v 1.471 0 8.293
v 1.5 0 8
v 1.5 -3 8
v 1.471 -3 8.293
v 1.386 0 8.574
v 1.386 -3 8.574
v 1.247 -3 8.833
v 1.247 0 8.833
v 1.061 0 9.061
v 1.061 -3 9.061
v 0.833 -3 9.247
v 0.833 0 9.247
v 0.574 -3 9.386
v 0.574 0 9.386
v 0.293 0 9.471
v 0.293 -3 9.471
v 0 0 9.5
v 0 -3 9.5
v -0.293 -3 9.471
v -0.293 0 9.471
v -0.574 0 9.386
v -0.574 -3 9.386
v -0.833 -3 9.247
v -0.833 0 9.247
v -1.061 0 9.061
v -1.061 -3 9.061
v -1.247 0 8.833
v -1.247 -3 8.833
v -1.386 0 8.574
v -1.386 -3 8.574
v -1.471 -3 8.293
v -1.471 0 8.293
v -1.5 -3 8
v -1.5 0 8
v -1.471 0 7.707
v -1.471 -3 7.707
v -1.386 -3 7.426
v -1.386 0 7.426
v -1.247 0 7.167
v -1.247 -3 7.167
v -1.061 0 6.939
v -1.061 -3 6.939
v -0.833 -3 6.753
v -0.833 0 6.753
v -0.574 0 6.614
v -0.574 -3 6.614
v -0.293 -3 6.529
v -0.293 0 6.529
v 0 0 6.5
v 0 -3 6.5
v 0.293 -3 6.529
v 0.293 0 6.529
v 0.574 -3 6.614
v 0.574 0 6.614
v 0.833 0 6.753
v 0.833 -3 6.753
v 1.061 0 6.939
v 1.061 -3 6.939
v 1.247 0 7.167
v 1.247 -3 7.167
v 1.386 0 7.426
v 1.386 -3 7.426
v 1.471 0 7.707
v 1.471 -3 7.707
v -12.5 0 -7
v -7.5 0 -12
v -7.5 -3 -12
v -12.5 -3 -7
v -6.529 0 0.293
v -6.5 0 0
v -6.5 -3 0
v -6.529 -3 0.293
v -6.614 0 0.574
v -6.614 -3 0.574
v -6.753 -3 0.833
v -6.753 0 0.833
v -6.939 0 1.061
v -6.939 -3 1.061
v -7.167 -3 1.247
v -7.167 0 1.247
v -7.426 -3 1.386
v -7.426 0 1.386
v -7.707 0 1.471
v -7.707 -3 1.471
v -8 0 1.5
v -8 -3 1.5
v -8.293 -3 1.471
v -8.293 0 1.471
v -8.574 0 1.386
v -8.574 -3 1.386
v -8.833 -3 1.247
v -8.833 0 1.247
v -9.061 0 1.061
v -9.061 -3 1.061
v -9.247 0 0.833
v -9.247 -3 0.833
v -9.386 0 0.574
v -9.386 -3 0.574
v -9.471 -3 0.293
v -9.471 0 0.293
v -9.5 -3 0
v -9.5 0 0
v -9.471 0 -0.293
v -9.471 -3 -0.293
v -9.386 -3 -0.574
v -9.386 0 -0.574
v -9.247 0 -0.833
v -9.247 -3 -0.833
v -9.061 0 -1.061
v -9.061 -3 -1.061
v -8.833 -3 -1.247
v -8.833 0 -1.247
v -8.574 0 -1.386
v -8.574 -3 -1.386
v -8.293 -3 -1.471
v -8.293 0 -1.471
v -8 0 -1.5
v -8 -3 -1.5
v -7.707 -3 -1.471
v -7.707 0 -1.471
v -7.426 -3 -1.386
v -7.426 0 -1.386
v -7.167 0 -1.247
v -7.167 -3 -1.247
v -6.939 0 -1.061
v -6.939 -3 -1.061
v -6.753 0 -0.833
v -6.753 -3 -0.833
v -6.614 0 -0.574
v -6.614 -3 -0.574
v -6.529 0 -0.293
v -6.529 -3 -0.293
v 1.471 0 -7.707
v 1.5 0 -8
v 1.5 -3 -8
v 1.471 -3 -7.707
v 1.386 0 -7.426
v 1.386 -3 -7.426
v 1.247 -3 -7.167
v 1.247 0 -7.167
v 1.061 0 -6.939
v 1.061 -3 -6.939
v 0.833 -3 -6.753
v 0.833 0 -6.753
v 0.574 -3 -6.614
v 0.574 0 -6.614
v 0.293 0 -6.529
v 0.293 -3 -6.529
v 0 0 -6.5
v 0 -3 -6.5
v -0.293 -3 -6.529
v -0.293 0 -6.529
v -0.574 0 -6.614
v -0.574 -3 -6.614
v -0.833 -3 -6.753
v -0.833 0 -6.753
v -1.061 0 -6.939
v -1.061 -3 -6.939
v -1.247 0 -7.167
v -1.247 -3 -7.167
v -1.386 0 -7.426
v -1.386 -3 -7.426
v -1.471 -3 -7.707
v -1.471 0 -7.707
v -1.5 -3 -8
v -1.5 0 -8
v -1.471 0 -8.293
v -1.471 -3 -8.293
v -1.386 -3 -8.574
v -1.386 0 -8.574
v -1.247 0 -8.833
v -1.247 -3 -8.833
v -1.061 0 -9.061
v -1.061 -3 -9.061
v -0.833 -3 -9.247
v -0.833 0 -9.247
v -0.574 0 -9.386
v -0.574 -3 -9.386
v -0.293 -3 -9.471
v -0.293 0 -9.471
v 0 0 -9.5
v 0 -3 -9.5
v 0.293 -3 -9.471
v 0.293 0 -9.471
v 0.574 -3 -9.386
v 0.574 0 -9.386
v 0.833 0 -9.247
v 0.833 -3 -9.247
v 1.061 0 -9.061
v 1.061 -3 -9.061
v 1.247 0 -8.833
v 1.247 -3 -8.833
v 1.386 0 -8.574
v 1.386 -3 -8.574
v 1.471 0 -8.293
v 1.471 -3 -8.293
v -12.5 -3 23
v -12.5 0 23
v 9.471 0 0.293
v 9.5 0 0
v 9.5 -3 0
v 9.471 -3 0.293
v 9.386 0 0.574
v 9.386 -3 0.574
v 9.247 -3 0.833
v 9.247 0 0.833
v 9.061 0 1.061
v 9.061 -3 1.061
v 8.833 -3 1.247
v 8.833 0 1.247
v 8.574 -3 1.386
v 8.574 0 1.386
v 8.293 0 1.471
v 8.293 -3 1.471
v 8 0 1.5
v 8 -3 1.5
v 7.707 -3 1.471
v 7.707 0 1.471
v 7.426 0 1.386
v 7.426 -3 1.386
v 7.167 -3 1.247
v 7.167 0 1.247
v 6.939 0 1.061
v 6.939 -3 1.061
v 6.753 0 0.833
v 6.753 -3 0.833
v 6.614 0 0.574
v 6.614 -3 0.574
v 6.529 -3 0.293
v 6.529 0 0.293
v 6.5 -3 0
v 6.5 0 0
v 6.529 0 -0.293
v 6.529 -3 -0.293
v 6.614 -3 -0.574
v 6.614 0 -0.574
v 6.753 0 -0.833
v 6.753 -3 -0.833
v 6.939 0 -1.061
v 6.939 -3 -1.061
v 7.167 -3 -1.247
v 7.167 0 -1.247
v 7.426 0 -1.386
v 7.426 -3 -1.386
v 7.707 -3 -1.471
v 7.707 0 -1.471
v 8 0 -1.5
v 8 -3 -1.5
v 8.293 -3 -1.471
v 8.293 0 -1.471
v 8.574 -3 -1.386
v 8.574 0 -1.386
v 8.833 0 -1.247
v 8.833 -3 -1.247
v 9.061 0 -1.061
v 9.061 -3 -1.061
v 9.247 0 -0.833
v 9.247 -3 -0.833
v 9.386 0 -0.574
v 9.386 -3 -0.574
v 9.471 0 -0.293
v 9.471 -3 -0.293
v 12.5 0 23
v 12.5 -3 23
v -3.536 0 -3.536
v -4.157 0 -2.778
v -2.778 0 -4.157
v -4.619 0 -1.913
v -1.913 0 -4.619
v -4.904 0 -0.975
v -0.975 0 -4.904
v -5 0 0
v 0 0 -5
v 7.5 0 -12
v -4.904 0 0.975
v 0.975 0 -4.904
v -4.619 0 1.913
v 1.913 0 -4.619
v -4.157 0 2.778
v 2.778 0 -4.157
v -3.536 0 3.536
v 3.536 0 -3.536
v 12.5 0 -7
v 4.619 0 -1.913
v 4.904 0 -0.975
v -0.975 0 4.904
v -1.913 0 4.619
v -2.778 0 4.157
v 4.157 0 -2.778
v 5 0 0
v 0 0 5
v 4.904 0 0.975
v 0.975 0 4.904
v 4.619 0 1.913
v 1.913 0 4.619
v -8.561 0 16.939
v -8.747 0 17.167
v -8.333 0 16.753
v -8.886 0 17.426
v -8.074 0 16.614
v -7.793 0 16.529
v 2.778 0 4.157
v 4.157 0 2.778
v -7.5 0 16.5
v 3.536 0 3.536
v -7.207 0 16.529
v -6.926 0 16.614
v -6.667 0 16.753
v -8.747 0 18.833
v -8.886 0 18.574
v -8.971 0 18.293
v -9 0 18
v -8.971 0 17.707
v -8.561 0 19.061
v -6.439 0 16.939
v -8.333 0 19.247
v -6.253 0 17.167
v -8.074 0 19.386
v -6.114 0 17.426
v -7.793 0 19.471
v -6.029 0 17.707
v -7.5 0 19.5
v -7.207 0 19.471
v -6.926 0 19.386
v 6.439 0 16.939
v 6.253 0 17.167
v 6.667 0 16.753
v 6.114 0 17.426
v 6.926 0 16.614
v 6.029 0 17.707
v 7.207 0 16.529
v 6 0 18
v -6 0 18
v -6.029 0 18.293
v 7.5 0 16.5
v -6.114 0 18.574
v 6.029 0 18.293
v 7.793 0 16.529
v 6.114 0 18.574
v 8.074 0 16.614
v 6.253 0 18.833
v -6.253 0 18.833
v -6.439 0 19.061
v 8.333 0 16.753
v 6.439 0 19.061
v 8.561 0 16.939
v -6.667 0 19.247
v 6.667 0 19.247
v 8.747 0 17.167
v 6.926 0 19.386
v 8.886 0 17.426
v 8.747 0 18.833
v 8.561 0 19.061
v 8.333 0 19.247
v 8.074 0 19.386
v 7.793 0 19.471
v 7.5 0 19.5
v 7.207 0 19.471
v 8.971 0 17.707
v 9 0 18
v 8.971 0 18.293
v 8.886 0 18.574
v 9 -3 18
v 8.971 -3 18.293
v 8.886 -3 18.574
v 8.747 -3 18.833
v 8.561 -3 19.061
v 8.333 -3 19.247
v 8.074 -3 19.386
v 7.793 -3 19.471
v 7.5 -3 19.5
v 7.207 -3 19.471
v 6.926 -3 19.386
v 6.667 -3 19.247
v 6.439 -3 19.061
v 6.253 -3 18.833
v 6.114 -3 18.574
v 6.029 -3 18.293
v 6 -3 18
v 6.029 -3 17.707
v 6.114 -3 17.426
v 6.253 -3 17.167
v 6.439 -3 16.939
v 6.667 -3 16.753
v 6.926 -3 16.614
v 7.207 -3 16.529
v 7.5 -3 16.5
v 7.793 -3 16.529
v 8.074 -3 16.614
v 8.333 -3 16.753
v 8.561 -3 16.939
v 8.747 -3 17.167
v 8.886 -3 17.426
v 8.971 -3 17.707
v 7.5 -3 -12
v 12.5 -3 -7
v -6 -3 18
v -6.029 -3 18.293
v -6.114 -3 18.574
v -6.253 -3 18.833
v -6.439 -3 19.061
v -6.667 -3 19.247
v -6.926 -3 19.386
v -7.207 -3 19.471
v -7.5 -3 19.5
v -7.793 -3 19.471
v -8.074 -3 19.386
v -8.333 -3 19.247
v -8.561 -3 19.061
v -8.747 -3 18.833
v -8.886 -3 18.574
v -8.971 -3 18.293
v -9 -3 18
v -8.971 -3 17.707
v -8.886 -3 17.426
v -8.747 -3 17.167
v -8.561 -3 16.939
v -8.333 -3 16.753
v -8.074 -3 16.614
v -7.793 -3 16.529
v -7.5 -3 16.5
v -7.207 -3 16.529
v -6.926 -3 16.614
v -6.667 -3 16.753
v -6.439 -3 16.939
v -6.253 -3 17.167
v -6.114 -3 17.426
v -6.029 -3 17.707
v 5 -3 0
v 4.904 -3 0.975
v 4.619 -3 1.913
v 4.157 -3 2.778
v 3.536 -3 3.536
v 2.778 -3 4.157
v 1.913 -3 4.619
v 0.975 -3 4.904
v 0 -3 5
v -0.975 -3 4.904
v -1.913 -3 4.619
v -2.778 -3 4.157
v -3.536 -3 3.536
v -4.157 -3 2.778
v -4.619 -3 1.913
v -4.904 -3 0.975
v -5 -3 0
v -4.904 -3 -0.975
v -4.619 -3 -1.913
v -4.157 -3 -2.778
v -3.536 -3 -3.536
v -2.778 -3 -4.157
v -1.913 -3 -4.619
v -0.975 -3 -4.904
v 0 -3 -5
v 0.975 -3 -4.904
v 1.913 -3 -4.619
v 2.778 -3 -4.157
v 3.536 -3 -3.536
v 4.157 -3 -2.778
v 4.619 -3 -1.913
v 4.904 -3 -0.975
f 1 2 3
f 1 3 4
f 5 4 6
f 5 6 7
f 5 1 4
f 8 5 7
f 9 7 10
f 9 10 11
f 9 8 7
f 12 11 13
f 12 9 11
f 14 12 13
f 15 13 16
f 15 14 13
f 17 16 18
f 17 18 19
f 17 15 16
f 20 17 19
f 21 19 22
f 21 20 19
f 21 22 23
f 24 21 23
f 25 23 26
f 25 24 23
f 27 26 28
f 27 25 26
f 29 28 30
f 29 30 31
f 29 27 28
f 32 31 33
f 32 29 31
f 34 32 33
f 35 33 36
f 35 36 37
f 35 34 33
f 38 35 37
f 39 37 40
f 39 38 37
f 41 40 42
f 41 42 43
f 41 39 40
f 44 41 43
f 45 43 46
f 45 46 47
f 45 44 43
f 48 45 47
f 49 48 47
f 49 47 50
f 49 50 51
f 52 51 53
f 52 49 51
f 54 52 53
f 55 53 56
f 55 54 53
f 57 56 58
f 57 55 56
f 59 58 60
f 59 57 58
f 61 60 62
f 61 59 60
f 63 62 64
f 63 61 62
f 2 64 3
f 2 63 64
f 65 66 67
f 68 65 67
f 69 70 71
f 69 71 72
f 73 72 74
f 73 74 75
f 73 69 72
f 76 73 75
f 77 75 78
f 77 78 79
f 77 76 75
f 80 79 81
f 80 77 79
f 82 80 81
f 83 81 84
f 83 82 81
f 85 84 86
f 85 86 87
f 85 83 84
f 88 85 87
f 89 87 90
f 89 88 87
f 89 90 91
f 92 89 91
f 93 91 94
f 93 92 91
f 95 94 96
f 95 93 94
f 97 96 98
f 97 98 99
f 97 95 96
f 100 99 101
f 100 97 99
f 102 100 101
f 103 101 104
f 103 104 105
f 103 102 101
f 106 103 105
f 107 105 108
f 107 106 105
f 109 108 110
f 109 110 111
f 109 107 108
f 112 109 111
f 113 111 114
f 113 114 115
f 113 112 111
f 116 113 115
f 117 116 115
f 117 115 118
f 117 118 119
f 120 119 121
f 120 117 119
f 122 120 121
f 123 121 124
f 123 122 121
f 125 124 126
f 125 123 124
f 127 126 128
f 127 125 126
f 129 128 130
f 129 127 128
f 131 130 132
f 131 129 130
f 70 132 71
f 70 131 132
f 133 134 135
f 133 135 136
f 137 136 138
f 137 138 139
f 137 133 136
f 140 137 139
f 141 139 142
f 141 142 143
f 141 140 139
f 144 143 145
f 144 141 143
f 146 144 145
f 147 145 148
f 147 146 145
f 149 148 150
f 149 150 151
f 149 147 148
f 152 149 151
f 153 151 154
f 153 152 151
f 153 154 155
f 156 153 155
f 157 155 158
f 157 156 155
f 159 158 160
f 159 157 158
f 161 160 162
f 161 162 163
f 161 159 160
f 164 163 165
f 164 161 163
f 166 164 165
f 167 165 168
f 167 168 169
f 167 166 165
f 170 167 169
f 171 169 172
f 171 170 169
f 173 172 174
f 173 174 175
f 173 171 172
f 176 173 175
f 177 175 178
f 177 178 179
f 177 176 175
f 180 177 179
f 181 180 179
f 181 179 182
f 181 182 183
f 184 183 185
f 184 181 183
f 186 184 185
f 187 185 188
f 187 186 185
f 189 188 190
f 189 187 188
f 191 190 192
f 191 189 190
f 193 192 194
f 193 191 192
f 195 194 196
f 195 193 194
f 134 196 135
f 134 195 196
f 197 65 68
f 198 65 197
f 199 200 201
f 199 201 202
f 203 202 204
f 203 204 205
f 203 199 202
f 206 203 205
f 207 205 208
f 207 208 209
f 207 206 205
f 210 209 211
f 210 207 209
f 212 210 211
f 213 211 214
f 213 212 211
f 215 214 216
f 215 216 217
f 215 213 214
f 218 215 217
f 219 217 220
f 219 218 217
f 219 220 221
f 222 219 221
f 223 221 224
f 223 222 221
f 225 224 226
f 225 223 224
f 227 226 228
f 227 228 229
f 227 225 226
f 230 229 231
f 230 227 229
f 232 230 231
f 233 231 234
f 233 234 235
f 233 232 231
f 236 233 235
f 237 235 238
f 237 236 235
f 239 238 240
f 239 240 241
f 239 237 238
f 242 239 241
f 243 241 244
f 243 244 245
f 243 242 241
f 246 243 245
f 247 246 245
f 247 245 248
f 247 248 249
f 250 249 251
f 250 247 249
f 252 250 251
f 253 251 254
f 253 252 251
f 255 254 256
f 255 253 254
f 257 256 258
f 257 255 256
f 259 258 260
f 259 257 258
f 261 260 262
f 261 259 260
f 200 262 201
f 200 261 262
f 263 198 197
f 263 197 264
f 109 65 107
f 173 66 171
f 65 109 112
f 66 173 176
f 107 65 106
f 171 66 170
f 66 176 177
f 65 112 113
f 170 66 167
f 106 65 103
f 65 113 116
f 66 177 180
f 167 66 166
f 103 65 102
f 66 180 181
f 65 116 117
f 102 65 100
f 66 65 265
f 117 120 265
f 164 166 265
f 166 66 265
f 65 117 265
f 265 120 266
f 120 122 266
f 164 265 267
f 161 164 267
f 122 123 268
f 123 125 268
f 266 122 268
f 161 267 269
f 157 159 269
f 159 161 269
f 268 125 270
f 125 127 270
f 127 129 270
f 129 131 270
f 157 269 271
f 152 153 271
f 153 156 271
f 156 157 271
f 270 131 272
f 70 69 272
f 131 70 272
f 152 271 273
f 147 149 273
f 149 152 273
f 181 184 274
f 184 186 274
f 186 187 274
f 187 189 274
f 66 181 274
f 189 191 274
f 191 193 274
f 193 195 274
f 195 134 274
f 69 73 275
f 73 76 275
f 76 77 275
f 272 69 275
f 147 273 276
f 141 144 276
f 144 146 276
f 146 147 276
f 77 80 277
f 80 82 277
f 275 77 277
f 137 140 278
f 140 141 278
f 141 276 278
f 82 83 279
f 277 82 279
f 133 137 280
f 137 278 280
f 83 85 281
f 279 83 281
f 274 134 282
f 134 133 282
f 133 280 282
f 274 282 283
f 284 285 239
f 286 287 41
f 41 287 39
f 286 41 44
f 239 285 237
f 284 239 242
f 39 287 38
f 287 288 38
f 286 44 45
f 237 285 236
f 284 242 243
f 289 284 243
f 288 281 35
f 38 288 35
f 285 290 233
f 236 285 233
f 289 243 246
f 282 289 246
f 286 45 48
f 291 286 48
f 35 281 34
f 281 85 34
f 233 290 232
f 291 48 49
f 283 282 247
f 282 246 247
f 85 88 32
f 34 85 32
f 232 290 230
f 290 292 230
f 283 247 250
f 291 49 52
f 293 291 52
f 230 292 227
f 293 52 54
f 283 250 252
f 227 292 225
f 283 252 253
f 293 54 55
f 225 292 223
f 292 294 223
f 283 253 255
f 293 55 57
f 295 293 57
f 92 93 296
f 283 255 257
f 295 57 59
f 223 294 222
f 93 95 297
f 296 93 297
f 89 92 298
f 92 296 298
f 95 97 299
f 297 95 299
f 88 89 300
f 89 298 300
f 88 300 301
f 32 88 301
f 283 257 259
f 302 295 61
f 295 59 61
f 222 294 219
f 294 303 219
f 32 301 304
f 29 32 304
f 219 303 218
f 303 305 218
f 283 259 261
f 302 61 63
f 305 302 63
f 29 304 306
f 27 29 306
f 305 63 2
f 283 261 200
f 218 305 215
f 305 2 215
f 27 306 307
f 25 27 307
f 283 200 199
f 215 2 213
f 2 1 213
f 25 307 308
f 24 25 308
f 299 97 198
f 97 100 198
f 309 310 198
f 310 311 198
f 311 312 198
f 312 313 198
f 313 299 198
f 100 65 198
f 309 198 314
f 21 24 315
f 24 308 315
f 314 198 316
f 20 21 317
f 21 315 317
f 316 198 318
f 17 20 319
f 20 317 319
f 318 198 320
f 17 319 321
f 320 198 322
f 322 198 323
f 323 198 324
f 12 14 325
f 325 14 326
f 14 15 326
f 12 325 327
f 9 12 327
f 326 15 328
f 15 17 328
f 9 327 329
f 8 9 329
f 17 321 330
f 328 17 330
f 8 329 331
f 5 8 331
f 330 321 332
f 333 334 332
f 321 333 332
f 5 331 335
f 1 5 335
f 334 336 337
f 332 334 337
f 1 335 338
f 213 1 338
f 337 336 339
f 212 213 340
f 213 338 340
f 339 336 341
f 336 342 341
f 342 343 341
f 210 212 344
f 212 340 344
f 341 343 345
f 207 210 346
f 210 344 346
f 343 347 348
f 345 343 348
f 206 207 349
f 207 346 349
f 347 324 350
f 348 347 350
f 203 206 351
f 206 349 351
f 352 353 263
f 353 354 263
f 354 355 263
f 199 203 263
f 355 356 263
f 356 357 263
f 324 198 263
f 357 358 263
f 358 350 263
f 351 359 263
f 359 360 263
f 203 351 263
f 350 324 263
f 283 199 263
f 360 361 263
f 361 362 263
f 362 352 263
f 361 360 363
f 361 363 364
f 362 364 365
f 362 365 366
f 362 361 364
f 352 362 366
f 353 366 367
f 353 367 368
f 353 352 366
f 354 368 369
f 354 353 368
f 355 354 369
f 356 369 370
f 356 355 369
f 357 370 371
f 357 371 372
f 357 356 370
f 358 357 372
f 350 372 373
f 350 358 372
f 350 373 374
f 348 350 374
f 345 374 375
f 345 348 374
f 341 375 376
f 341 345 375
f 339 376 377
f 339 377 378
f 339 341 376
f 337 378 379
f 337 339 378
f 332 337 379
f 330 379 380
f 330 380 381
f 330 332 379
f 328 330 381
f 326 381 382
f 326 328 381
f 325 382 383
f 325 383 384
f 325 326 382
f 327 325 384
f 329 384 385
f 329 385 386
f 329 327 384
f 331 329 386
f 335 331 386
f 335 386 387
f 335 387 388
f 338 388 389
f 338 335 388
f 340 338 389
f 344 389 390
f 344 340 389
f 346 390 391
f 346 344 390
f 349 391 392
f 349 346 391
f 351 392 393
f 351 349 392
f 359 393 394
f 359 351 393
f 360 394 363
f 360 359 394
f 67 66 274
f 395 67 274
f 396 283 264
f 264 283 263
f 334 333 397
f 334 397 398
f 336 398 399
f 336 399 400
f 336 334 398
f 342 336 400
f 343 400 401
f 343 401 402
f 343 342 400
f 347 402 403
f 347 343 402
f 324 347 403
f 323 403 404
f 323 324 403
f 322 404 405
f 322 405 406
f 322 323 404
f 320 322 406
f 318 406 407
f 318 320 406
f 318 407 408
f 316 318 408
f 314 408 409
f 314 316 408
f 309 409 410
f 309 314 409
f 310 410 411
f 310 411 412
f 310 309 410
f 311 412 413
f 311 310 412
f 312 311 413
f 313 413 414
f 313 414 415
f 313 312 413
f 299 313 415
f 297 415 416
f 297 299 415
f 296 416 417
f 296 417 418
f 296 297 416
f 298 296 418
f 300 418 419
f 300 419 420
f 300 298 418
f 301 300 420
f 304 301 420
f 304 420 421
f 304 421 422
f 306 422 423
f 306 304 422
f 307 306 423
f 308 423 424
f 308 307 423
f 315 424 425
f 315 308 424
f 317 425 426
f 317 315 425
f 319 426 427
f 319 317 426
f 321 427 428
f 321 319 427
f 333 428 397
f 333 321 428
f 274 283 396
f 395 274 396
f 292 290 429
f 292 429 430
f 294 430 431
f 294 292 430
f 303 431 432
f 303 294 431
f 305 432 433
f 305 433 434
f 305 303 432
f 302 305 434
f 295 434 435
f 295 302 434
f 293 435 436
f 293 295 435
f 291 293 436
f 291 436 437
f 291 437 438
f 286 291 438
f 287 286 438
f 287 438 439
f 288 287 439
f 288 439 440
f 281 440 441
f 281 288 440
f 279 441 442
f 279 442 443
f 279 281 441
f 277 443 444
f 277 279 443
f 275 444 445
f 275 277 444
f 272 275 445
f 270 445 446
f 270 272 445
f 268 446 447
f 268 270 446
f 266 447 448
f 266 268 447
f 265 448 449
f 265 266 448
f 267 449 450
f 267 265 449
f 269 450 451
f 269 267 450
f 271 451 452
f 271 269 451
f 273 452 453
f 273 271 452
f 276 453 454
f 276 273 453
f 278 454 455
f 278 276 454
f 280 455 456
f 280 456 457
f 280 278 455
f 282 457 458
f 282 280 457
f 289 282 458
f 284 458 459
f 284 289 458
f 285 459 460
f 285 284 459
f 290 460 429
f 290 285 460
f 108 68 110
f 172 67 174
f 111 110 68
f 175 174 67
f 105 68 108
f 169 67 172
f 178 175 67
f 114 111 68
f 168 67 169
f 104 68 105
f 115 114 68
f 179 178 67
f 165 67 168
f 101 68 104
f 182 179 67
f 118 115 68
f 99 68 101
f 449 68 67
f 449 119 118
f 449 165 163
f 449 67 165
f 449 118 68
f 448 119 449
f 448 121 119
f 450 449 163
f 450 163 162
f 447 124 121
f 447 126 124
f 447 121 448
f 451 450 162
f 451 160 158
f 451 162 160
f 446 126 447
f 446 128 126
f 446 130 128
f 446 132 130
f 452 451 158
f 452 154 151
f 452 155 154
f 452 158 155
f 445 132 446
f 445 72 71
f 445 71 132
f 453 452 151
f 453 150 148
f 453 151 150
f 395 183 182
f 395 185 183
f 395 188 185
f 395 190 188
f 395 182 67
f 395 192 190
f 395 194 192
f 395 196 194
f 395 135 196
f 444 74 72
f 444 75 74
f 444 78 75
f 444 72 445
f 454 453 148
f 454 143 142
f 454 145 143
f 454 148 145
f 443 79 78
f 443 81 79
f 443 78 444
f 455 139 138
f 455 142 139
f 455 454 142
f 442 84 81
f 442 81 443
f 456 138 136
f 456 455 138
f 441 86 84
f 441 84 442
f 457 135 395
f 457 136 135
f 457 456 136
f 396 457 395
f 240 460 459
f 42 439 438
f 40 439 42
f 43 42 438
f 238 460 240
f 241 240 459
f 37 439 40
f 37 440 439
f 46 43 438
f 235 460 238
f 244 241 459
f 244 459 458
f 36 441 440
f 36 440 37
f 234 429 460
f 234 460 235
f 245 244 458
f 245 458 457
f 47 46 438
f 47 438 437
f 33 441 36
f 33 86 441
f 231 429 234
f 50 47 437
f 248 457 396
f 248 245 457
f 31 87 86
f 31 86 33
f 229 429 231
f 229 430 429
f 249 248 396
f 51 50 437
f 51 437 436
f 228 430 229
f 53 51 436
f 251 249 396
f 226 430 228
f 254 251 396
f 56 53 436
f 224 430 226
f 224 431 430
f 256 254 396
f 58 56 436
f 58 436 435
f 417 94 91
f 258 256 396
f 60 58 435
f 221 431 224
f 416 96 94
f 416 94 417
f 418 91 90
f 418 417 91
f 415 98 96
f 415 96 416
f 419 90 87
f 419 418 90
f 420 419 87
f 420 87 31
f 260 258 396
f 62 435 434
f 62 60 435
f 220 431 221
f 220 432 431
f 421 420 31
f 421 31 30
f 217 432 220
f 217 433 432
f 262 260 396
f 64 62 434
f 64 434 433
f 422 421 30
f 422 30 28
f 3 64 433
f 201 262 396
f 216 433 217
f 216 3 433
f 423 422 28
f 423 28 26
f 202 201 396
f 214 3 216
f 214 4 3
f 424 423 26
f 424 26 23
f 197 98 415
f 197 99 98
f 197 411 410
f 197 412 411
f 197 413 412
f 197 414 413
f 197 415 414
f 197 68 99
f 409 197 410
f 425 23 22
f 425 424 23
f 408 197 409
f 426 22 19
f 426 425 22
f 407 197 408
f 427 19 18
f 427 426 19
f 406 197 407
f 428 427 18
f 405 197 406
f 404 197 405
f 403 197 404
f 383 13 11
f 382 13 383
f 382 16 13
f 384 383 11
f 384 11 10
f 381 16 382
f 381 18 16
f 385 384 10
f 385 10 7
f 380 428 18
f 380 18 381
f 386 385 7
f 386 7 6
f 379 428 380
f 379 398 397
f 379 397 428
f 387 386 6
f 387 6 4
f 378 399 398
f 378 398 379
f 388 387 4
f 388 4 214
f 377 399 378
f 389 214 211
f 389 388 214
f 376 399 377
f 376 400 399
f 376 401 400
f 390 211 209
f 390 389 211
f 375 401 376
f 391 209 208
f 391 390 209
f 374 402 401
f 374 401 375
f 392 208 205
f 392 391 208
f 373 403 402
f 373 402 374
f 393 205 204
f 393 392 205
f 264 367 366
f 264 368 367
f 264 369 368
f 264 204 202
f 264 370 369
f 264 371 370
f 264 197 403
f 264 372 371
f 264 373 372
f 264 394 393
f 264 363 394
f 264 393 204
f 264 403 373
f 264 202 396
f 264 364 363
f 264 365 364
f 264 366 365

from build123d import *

# Parameters (mm, degrees)
F0_W     = 25
F0_H     = 35
F0_R     = 1.5
F0_R_2   = 5
F1_DEPTH = 3
F2_SIZE  = 5


with BuildPart() as f1:
    # F0 (on Front) → F1 (new body)
    with BuildSketch(Plane.XZ):
        with Locations((0, 5.5)):
            Rectangle(F0_W, F0_H)
        with Locations((-8, 0)):
            Circle(F0_R, mode=Mode.SUBTRACT)
        with Locations((0, -8)):
            Circle(F0_R, mode=Mode.SUBTRACT)
        Circle(F0_R_2, mode=Mode.SUBTRACT)
        with Locations((8, 0)):
            Circle(F0_R, mode=Mode.SUBTRACT)
        with Locations((-7.5, 18)):
            Circle(F0_R, mode=Mode.SUBTRACT)
        with Locations((0, 8)):
            Circle(F0_R, mode=Mode.SUBTRACT)
        with Locations((7.5, 18)):
            Circle(F0_R, mode=Mode.SUBTRACT)
    extrude(amount=F1_DEPTH)

    # F2
    f2_edges = [f1.edges().sort_by_distance(p)[0] for p in [
        (-12.5, -1.5, -12),
        (12.5, -1.5, -12),
    ]]
    chamfer(f2_edges, length=F2_SIZE)


solid = f1.part
